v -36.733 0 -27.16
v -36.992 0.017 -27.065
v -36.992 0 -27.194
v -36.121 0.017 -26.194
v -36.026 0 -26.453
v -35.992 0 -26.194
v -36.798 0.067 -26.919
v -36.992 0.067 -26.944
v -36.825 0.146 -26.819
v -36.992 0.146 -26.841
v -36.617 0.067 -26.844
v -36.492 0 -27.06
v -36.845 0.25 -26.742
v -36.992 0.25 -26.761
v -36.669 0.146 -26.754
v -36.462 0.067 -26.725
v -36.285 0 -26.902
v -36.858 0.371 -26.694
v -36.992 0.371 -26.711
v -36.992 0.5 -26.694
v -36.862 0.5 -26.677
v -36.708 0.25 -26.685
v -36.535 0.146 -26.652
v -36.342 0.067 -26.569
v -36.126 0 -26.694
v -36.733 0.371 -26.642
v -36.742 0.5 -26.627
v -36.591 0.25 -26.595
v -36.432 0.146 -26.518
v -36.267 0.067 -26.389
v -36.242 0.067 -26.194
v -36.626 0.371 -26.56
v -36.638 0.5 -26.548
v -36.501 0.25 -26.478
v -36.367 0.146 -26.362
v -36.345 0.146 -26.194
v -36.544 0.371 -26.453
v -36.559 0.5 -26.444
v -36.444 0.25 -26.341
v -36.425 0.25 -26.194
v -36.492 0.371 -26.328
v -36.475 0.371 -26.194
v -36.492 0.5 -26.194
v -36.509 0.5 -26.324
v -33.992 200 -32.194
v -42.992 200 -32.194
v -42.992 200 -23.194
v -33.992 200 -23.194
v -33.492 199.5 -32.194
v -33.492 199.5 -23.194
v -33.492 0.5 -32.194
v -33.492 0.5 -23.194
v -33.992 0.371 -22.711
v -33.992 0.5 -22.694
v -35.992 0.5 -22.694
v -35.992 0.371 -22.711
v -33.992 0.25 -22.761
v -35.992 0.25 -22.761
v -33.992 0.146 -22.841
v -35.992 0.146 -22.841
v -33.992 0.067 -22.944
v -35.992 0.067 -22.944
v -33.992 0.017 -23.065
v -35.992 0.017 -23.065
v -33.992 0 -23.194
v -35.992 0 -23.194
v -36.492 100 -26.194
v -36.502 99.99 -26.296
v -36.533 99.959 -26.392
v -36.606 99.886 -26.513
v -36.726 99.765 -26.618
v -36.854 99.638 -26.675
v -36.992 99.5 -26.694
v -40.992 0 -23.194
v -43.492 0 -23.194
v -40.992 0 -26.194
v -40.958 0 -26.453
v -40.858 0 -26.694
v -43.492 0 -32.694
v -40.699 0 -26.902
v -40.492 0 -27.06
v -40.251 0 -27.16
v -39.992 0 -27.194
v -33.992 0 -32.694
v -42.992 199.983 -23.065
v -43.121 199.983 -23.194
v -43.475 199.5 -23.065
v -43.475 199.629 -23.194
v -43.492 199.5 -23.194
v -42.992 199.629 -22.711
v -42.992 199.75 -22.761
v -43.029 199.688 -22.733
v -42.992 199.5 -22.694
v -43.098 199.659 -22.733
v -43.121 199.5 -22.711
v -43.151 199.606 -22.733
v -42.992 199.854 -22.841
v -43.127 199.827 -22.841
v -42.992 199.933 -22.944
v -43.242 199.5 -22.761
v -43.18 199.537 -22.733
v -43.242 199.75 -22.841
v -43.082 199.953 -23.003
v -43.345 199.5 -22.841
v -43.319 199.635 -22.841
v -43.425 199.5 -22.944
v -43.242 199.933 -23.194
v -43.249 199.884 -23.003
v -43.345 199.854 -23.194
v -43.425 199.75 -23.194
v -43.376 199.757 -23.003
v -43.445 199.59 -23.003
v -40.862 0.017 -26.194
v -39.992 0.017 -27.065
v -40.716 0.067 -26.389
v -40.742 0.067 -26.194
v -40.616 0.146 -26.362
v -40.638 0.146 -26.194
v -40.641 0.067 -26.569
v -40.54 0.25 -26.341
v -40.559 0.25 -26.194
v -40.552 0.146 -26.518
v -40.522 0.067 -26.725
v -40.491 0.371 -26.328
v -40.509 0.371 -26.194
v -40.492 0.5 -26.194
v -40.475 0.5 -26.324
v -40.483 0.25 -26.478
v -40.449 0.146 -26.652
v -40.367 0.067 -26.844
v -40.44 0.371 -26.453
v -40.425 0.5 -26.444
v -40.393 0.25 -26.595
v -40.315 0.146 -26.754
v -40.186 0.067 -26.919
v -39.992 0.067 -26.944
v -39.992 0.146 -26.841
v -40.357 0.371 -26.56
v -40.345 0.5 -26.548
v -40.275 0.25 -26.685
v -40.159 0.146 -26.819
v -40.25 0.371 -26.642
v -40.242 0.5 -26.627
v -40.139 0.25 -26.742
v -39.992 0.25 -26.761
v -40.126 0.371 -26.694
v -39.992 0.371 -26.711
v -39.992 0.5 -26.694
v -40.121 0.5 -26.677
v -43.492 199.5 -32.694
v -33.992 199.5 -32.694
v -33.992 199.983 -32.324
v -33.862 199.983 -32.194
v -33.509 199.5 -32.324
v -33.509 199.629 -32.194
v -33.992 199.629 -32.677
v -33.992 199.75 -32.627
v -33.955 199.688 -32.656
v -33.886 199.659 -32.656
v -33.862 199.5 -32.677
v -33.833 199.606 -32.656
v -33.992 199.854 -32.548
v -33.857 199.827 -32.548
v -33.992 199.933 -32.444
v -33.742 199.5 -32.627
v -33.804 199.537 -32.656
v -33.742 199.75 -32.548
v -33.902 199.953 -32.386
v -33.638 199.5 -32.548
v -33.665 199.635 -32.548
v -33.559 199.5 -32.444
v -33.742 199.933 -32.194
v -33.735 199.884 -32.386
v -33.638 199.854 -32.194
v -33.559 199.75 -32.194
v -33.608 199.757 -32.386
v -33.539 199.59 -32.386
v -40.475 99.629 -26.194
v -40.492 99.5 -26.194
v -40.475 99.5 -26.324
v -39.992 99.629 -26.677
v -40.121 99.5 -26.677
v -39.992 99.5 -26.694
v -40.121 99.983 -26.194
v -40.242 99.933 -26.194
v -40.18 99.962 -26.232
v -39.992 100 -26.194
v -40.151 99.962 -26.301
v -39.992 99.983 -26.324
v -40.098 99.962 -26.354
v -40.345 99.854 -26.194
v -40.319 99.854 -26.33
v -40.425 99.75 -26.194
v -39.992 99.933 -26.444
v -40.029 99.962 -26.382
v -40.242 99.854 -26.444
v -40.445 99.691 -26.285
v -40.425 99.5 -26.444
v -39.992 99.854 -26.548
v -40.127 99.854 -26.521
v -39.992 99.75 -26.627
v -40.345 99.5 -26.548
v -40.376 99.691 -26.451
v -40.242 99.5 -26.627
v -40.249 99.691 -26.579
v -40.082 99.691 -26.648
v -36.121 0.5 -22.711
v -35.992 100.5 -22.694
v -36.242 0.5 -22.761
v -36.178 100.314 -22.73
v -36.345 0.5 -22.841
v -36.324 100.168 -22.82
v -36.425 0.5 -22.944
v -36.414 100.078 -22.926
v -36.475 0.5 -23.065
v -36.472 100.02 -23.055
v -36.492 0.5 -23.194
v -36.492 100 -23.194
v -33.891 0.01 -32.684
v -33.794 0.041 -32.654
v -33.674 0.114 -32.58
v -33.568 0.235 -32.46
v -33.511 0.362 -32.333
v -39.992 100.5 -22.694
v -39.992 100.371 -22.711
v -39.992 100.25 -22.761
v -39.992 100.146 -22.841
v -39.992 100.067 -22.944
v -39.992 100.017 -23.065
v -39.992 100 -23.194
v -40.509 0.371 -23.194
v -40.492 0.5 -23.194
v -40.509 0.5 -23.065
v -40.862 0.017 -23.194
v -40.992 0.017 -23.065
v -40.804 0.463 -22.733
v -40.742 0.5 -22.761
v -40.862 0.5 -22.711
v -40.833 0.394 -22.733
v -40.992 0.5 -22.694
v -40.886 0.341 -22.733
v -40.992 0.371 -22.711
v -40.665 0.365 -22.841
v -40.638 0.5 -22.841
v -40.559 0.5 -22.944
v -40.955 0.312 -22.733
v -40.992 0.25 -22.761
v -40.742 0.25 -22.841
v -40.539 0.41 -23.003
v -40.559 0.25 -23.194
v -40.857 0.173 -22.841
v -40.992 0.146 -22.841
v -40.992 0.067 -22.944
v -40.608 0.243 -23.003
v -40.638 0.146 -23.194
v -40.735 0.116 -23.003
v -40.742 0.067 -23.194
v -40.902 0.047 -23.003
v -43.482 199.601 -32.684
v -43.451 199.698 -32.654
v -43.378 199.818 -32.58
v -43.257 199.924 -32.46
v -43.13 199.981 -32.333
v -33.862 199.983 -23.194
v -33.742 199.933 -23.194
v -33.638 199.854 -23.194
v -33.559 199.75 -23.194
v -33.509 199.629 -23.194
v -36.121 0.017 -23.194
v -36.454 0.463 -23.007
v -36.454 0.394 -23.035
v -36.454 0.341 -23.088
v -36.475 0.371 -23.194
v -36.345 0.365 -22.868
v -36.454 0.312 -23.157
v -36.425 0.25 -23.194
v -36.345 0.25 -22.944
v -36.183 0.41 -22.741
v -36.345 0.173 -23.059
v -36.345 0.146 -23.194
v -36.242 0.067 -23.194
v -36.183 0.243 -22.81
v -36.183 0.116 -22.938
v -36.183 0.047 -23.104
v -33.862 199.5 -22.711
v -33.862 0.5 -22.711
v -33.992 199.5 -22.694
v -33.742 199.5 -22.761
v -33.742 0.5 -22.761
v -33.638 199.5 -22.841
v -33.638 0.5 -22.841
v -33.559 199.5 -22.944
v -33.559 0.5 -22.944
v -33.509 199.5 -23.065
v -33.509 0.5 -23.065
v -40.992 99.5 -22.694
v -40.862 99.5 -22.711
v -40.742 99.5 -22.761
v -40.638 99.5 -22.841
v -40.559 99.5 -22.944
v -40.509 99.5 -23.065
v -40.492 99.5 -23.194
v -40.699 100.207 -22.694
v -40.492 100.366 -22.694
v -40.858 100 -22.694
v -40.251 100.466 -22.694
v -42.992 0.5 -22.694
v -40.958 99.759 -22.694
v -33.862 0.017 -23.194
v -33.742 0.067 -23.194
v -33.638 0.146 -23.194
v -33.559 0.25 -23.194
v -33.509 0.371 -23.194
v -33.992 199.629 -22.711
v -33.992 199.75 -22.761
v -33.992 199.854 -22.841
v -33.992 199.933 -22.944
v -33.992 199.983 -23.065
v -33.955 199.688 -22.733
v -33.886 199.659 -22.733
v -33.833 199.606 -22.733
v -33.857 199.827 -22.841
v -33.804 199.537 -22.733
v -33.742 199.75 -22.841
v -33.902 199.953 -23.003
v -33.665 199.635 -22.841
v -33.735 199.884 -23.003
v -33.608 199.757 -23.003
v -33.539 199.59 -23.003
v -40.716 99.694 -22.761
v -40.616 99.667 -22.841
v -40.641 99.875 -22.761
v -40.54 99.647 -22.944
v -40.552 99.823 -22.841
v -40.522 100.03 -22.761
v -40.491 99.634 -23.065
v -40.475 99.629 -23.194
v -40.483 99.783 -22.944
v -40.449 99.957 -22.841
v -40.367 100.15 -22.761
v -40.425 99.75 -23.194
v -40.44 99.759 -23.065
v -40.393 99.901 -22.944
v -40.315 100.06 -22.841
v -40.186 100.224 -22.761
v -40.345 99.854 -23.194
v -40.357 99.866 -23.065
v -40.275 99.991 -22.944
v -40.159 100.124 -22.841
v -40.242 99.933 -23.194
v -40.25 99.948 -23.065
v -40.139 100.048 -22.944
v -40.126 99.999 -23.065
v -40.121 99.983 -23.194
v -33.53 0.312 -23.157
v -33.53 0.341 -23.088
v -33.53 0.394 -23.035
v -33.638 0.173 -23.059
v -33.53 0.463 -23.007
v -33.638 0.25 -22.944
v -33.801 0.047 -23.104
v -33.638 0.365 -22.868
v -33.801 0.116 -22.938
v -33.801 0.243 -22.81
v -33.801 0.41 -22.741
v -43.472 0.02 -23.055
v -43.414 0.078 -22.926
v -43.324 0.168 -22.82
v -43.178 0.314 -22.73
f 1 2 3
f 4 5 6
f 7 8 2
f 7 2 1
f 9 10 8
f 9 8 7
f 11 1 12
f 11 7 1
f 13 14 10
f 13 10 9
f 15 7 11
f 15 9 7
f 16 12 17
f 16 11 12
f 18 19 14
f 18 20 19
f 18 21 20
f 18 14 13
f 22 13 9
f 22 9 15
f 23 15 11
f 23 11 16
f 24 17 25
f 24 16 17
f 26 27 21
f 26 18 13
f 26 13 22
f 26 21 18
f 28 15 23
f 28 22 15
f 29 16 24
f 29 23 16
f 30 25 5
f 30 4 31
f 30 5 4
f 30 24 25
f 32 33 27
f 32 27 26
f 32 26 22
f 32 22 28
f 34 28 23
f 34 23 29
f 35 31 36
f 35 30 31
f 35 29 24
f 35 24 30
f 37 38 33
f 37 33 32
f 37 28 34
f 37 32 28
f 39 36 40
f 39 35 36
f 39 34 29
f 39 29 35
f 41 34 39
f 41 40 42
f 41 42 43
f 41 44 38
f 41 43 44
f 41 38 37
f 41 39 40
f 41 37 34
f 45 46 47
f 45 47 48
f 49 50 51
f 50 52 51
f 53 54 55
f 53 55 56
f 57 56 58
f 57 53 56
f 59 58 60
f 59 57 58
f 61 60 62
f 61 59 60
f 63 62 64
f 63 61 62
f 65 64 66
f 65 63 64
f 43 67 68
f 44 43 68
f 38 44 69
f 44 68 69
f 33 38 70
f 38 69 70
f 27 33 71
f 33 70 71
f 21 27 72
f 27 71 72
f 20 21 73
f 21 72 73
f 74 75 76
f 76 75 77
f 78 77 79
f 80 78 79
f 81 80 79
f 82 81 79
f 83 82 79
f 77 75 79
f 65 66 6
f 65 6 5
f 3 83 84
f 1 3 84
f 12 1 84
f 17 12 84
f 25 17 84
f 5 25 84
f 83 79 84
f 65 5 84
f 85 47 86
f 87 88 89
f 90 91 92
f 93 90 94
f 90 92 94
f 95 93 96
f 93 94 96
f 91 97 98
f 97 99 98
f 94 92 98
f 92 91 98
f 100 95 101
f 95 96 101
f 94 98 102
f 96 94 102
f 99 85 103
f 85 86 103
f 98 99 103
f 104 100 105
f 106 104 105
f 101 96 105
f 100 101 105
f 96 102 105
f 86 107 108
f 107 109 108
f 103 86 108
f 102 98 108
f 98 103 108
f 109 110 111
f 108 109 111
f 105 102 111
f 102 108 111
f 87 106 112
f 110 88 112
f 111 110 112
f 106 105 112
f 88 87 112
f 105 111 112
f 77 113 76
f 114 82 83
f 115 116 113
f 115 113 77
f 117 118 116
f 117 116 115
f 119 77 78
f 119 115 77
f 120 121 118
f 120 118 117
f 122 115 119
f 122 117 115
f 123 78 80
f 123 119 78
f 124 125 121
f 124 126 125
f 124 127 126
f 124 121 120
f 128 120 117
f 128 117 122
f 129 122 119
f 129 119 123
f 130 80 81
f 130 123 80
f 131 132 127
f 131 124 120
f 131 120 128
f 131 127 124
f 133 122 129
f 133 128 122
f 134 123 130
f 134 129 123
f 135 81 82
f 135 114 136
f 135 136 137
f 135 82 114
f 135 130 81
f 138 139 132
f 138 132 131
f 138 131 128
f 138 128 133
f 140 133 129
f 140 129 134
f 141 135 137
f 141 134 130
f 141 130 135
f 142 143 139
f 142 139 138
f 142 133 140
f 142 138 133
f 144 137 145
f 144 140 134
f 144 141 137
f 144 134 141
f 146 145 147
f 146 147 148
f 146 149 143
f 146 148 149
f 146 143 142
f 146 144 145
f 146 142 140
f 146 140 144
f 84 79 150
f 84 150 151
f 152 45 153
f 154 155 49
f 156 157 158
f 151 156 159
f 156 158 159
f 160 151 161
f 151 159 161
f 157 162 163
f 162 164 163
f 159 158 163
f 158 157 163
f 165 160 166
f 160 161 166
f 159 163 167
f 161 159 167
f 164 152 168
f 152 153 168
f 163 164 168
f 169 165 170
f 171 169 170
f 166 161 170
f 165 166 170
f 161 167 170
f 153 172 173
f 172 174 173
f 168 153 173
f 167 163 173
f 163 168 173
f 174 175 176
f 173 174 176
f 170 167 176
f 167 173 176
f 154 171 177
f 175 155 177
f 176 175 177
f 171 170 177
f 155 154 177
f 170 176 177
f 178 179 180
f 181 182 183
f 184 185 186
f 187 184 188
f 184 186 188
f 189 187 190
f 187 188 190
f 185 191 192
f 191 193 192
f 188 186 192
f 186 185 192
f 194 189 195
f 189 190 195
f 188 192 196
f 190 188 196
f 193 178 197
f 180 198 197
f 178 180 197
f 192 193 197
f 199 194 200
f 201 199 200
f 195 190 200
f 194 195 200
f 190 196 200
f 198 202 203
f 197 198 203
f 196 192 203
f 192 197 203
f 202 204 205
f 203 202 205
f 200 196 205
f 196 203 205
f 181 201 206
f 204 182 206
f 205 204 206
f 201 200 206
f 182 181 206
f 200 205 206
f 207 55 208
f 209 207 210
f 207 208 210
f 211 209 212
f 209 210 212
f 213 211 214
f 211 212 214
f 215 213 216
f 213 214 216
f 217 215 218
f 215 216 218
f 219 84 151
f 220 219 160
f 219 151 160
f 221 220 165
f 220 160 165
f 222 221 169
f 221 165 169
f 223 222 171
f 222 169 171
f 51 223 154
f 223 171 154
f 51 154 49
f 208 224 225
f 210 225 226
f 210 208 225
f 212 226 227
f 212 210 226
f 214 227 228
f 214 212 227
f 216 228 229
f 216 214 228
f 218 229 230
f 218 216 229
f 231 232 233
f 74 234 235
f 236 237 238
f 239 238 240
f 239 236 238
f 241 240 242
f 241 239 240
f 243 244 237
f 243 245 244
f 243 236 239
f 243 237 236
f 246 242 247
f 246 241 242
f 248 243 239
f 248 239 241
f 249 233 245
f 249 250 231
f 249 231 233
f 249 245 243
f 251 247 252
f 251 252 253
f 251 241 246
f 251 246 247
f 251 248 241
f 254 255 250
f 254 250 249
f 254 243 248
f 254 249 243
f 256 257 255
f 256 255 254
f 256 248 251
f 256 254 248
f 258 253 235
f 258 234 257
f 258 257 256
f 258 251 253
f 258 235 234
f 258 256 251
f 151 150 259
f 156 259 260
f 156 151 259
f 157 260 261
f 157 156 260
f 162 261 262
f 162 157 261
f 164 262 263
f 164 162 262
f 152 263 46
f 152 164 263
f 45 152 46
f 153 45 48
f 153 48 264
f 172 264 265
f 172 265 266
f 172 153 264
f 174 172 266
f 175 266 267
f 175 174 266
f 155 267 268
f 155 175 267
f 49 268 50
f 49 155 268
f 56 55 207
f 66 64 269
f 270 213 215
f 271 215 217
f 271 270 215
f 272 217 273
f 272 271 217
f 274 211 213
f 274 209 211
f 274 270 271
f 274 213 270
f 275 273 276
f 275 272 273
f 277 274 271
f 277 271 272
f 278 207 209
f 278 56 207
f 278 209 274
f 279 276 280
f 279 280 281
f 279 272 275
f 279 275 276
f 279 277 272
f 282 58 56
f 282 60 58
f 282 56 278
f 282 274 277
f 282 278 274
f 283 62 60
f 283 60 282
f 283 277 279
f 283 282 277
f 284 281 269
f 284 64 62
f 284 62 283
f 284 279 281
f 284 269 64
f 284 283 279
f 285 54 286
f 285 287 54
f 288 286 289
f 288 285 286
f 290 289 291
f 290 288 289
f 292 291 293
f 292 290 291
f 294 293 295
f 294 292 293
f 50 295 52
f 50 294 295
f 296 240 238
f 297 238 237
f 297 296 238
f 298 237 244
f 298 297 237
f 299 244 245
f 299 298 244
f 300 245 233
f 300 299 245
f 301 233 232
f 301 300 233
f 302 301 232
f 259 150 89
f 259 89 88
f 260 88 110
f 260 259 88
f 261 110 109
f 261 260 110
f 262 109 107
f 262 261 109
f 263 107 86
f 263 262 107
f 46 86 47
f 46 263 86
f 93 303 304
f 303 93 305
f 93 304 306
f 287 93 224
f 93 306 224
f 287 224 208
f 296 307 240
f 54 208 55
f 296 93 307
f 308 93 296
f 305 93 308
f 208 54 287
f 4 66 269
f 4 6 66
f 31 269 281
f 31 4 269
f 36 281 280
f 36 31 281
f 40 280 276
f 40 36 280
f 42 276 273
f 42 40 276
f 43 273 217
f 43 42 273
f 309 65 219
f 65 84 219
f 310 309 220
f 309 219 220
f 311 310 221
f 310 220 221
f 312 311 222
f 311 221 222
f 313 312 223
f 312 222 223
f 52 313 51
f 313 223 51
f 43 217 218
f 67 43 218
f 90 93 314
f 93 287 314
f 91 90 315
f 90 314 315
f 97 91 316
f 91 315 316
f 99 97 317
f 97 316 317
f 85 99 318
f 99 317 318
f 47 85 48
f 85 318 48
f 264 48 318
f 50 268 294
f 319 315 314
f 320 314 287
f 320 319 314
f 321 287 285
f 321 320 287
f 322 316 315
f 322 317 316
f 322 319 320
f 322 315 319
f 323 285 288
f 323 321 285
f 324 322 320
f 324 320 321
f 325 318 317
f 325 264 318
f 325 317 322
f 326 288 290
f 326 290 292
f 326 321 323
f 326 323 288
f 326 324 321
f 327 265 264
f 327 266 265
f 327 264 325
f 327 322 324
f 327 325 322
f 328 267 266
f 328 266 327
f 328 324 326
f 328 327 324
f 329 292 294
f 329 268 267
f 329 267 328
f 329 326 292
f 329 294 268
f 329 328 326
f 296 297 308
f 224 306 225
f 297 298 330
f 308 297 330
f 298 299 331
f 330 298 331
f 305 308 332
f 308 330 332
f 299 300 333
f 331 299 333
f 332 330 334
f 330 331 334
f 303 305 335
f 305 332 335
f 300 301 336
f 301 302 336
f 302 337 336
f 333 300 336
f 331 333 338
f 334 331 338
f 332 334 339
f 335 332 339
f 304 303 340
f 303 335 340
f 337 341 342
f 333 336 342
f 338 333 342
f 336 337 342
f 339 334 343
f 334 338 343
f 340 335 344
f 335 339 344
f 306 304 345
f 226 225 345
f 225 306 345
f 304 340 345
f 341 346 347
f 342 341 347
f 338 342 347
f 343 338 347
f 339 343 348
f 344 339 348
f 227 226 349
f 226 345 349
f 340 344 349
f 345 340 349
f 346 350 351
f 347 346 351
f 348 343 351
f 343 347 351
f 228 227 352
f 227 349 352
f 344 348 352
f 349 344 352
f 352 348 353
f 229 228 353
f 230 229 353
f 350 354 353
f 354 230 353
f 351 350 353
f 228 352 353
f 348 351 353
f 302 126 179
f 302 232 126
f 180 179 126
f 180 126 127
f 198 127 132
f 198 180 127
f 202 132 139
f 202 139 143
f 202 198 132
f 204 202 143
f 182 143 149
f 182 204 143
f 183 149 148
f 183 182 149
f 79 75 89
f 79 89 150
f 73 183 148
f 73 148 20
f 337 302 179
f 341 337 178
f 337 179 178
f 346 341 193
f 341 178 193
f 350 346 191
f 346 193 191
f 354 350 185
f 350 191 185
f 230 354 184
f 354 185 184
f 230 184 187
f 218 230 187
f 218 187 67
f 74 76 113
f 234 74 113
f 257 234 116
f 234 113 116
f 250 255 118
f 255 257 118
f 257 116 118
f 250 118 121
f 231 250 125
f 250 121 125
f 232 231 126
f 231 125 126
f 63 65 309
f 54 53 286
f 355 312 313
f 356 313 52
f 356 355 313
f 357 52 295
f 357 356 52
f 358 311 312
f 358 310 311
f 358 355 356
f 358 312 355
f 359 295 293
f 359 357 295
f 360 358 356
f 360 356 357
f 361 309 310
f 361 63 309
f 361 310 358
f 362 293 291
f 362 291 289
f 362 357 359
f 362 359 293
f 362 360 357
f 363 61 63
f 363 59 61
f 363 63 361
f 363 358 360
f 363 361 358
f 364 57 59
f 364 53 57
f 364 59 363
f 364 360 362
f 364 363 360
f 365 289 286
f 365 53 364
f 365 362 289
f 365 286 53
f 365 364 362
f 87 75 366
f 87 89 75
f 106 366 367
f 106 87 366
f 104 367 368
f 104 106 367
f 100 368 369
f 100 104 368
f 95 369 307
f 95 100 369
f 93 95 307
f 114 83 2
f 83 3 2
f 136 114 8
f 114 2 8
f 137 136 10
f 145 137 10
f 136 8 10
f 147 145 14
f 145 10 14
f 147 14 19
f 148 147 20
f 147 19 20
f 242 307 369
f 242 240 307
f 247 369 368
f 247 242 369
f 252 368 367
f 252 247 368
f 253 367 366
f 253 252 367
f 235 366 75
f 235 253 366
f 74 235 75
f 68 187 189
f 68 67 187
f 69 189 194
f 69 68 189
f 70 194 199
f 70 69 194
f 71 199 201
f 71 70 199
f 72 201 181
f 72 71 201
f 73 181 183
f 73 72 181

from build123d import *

# Parameters (mm, degrees)
SKETCH1_W           = 10
SKETCH1_H           = 10
BOSS_EXTRUDE1_DEPTH = 200
SKETCH2_W           = 4
SKETCH2_H           = 100
CUT_EXTRUDE1_DEPTH  = 4
FILLET1_R           = 0.5


with BuildPart() as part:
    # Sketch1 → Boss-Extrude1 (new body)
    with BuildSketch(Plane(origin=(0, 0, 0), x_dir=(1, 0, 0), z_dir=(0, 1, 0))):
        with Locations((-38.49189023, 27.694440025)):
            Rectangle(SKETCH1_W, SKETCH1_H)
    extrude(amount=BOSS_EXTRUDE1_DEPTH)

    # Sketch2 → Cut-Extrude1 (cut)
    with BuildSketch(Plane.XY.offset(-22.694440025)):
        with Locations((-38.49189023, 50)):
            Rectangle(SKETCH2_W, SKETCH2_H)
    extrude(amount=-CUT_EXTRUDE1_DEPTH, mode=Mode.SUBTRACT)

    # Fillet1
    fillet1_edges = [part.edges().sort_by_distance(p)[0] for p in [
        (-33.49189023, 200, -27.694440025),
        (-38.49189023, 200, -32.694440025),
        (-34.99189023, 0, -22.694440025),
        (-40.49189023, 50, -26.694440025),
        (-40.49189023, 0, -24.694440025),
        (-38.49189023, 100, -22.694440025),
        (-40.49189023, 100, -24.694440025),
        (-36.49189023, 50, -22.694440025),
        (-38.49189023, 0, -26.694440025),
        (-36.49189023, 0, -24.694440025),
        (-38.49189023, 100, -26.694440025),
        (-36.49189023, 50, -26.694440025),
        (-40.49189023, 50, -22.694440025),
        (-43.49189023, 200, -27.694440025),
        (-33.49189023, 0, -27.694440025),
        (-41.99189023, 0, -22.694440025),
        (-38.49189023, 200, -22.694440025),
        (-33.49189023, 100, -32.694440025),
        (-33.49189023, 100, -22.694440025),
        (-43.49189023, 100, -22.694440025),
    ]]
    fillet(fillet1_edges, radius=FILLET1_R)


solid = part.part
